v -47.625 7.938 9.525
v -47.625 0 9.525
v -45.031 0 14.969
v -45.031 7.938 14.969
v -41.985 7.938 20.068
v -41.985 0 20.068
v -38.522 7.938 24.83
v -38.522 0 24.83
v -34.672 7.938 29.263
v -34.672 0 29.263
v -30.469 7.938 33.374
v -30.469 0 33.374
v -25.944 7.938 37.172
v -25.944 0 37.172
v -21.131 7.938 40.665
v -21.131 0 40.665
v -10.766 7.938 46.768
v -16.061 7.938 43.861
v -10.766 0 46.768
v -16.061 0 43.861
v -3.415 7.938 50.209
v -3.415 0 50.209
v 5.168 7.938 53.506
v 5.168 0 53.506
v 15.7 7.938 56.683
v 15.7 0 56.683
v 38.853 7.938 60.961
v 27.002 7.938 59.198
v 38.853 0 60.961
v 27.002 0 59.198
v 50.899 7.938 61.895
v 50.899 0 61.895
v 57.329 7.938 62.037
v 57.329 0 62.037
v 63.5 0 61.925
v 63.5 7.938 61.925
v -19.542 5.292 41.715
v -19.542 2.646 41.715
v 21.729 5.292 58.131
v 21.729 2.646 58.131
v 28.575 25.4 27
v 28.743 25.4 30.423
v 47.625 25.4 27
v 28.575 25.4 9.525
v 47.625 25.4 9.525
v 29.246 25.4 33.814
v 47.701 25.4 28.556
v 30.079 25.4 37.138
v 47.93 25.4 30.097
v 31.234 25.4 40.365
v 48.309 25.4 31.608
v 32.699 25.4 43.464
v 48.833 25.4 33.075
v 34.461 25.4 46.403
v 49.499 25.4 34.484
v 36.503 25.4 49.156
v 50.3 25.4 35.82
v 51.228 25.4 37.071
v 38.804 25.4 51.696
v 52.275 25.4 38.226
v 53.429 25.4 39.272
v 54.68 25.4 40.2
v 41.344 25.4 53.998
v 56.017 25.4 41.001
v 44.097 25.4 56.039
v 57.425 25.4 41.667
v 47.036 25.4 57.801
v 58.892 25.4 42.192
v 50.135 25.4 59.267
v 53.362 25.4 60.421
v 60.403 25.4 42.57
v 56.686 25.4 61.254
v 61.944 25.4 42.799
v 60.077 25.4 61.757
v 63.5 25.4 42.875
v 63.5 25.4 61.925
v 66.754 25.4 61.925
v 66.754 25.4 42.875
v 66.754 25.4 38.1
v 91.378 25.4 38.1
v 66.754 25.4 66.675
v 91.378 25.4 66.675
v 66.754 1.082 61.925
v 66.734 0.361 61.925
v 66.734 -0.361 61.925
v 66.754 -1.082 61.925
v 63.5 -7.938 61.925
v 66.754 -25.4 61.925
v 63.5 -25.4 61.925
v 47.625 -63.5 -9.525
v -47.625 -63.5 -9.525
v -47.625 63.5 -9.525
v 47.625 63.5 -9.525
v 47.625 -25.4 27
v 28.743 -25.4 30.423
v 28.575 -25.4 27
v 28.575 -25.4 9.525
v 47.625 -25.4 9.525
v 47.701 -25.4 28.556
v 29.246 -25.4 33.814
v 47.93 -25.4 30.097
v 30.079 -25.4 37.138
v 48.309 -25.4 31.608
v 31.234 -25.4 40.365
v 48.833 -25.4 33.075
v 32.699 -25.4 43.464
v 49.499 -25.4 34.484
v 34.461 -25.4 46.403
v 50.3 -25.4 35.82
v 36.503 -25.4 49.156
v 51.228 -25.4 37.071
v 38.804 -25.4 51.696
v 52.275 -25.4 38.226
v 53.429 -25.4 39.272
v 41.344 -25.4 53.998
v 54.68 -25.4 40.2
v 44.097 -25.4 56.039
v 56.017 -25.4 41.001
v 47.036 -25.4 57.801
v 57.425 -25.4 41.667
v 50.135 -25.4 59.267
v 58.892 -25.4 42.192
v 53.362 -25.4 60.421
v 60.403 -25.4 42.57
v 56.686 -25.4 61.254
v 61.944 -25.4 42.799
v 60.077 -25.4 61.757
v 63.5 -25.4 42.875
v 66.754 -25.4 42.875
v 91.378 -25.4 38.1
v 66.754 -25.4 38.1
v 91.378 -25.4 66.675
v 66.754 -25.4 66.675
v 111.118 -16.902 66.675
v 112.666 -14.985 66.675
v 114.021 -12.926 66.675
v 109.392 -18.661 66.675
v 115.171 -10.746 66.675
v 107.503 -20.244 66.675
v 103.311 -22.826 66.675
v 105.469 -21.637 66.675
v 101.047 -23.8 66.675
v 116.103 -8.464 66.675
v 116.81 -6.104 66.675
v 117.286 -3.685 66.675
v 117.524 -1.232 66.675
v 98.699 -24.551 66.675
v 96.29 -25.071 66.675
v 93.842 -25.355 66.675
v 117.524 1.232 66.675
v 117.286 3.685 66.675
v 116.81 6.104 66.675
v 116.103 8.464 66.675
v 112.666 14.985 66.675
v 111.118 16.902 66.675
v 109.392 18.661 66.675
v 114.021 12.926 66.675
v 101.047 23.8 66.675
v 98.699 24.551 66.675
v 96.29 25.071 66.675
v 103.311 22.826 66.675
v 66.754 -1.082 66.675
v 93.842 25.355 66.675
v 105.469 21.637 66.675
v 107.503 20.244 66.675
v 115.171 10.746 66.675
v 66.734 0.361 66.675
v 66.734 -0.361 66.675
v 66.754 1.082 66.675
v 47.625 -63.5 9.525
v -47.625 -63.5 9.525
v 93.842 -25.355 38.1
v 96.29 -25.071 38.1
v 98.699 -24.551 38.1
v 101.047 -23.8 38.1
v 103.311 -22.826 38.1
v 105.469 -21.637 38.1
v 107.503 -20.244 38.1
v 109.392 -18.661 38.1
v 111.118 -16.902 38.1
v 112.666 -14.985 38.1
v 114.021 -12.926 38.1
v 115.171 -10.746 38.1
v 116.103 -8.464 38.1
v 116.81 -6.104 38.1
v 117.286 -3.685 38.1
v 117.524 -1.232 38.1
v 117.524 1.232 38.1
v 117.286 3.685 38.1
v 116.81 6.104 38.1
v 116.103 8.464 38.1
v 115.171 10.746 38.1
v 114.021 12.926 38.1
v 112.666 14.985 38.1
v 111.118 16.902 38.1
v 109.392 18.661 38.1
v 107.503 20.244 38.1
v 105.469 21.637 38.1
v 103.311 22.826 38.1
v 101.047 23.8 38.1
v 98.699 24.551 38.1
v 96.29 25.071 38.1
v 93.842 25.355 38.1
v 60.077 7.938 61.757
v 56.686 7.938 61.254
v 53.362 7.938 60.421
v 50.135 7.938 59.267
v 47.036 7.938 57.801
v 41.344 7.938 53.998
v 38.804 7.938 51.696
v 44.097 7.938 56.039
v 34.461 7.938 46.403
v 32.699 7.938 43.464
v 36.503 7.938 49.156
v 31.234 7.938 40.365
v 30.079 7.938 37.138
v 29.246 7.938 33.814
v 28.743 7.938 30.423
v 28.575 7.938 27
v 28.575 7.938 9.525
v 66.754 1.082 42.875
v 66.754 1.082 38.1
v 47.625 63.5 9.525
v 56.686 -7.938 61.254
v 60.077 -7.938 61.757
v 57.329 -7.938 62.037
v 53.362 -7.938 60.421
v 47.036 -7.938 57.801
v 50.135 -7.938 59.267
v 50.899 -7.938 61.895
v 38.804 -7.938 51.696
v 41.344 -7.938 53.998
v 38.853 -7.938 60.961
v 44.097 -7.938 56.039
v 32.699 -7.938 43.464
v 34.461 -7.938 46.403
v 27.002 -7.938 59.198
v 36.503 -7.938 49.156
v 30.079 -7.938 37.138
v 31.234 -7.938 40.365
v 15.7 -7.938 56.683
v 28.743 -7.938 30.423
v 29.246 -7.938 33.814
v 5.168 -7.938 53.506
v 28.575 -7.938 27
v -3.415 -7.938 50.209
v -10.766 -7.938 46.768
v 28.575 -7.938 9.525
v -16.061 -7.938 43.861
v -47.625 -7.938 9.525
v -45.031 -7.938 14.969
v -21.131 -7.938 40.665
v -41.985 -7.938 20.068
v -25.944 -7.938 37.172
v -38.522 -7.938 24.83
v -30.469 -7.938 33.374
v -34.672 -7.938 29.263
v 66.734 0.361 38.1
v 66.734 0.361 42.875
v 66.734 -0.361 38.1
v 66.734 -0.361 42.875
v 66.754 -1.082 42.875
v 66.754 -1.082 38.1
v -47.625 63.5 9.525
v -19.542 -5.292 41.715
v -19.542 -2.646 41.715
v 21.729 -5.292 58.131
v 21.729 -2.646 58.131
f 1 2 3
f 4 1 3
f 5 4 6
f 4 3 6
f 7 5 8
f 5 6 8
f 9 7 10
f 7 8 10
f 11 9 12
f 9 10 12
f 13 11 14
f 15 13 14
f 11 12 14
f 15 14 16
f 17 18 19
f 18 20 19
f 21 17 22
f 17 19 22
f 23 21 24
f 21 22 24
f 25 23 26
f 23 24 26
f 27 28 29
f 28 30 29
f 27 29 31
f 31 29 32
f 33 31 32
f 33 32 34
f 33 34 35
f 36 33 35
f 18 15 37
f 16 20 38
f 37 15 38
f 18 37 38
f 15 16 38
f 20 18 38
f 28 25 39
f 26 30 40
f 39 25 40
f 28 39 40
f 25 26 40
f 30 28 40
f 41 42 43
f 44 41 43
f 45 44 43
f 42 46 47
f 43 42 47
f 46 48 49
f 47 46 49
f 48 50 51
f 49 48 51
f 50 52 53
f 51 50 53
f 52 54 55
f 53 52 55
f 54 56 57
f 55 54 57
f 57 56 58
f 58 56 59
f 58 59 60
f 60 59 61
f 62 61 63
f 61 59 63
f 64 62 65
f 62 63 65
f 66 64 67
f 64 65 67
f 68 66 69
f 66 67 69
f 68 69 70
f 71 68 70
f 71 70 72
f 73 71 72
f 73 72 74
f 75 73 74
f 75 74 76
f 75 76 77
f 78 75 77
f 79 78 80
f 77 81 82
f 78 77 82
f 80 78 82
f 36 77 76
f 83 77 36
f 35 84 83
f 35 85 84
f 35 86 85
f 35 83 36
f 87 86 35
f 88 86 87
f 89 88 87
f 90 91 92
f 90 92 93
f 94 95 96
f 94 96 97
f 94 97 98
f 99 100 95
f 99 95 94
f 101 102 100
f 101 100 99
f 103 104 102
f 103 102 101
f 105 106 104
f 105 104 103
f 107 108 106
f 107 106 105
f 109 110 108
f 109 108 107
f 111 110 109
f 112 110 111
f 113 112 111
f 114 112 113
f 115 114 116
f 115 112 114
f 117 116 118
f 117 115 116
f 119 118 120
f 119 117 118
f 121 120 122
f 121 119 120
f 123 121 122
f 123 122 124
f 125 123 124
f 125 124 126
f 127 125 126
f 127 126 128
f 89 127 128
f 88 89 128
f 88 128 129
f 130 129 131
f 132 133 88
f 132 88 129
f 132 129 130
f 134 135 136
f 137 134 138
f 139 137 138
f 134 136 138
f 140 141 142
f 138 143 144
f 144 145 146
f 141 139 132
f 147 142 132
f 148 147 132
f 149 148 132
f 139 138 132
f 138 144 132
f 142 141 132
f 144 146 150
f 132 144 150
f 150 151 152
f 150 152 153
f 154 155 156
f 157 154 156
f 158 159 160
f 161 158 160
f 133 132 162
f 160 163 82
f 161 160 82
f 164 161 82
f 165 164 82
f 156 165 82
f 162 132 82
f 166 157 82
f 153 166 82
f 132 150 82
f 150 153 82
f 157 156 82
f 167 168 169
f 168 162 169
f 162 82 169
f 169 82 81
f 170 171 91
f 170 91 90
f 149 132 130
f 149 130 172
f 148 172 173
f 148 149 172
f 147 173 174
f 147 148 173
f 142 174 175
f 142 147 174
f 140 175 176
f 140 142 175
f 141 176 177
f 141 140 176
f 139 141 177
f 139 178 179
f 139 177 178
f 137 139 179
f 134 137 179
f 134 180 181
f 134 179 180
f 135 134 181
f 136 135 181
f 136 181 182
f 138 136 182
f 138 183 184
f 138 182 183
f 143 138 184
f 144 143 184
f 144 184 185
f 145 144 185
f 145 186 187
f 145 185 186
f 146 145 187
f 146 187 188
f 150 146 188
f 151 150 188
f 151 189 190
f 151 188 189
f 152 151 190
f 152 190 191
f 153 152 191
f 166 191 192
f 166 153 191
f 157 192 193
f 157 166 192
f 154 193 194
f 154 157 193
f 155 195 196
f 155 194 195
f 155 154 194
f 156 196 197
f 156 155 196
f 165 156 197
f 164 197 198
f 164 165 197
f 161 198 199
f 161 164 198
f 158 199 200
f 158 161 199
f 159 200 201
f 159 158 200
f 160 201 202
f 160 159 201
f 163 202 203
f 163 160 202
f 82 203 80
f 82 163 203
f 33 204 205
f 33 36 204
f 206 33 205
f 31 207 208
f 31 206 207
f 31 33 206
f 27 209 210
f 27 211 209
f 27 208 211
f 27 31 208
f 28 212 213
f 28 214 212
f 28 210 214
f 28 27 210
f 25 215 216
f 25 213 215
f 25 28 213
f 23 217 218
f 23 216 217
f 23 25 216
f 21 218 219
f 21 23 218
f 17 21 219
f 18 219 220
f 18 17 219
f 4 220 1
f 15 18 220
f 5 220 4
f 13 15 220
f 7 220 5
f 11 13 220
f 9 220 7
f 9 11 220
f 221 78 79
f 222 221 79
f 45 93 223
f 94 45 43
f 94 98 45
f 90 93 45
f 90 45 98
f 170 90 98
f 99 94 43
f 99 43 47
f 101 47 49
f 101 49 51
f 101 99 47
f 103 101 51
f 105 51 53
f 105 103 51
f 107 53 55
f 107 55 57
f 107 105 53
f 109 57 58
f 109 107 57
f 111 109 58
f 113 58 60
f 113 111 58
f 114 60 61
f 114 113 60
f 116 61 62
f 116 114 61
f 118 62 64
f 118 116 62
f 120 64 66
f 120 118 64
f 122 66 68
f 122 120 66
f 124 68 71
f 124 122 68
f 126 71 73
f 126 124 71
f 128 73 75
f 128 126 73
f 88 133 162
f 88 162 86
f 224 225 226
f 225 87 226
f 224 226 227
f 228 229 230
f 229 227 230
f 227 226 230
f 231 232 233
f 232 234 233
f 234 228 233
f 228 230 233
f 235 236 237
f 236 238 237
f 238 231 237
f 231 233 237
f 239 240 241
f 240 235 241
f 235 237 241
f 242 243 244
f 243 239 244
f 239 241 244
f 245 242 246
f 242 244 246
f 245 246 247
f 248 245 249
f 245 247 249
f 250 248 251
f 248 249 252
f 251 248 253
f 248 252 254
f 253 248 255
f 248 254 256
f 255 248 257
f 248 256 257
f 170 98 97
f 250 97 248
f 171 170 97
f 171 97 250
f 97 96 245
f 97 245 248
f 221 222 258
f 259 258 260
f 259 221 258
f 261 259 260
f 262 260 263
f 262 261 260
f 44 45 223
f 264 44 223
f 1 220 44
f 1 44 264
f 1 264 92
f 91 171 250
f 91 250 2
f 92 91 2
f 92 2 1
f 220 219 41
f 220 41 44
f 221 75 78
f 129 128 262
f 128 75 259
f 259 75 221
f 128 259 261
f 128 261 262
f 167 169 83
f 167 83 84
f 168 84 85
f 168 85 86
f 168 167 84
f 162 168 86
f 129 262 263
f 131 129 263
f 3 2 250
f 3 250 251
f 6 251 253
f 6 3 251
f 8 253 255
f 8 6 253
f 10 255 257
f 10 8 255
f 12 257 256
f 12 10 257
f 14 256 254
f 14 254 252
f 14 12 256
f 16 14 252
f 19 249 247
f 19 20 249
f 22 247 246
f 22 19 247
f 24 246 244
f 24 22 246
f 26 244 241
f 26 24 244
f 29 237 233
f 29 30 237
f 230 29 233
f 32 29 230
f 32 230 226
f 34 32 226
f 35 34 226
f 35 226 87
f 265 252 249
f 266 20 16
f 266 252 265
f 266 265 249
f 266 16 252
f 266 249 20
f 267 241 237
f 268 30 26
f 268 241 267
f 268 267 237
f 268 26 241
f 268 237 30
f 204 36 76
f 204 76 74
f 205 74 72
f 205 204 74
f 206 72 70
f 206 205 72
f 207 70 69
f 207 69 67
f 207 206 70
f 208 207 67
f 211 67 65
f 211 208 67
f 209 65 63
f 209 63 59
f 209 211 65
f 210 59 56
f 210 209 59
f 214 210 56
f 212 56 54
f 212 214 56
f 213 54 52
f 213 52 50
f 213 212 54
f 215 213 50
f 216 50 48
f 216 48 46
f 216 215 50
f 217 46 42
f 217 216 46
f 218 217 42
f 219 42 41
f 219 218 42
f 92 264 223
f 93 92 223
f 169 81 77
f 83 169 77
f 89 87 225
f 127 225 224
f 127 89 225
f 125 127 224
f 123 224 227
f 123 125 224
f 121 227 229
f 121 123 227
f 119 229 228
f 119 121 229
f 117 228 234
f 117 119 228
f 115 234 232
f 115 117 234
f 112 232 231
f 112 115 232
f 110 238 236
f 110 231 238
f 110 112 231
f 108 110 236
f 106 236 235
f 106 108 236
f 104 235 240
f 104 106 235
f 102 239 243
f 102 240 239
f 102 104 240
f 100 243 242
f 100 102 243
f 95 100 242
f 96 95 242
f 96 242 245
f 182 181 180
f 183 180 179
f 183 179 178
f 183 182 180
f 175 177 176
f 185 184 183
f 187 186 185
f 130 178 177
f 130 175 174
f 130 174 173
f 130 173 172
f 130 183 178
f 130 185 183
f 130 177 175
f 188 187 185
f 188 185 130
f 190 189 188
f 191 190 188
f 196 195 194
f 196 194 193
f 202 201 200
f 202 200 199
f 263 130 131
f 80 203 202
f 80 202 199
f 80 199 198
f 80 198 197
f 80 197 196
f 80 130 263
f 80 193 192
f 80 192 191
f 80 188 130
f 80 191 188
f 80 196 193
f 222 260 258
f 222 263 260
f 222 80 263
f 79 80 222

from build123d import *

# Parameters (mm, degrees)
F1_DEPTH = 63.5
F2_DEPTH = 25.4
F3_DEPTH = 25.4
F4_DEPTH = 7.9375
F0_W     = 25.4115133166
F0_H     = 28.575


with BuildPart() as f1:
    # F0 (on Front) → F1 (new body, symmetric)
    with BuildSketch(Plane.XZ):
        Polygon((28.575, 9.525), (-47.625, 9.525), (-47.625, -9.525), (47.625, -9.525), (47.625, 9.525), align=None)
    extrude(amount=F1_DEPTH, both=True)

    # F0 (on Front) → F2 (join, symmetric)
    with BuildSketch(Plane.XZ):
        with BuildLine():
            Line((28.575, 27.0002), (28.575, 9.525))
            Line((28.575, 9.525), (47.625, 9.525))
            Line((47.625, 9.525), (47.625, 27.0002))
            ThreePointArc((47.625, 27.0002), (52.2746798487, 38.2255201513), (63.5, 42.8752))
            Line((63.5, 42.8752), (66.754385829, 42.8752))
            Line((66.754385829, 42.8752), (66.754385829, 61.9252))
            Line((66.754385829, 61.9252), (63.5, 61.9252))
            ThreePointArc((63.5, 61.9252), (38.8042956671, 51.6959043329), (28.575, 27.0002))
        make_face()
    extrude(amount=F2_DEPTH, both=True)

    # F0 (on Front) → F3 (join, symmetric)
    with BuildSketch(Plane.XZ):
        Polygon((66.754385829, 66.675), (66.754385829, 61.9252), (66.754385829, 42.8752), (66.754385829, 38.1), (92.1428725123, 38.1), (92.1428725123, 66.675), align=None)
    extrude(amount=F3_DEPTH, both=True)

    # F0 (on Front) → F4 (join, symmetric)
    with BuildSketch(Plane.XZ):
        with BuildLine():
            add(Edge.make_bspline(
                [(-47.625, 9.525), (-30.3663147909, 50.6522115959), (25.7086480849, 63.3923630702), (63.5, 61.9252)],
                knots=[0, 0, 0, 0, 122.8598656398, 122.8598656398, 122.8598656398, 122.8598656398], degree=3))
            Line((-47.625, 9.525), (28.575, 9.525))
            Line((28.575, 9.525), (28.575, 27.0002))
            ThreePointArc((28.575, 27.0002), (38.8042956671, 51.6959043329), (63.5, 61.9252))
        make_face()
    extrude(amount=F4_DEPTH, both=True)

    # F0 (on Front) → F5 (revolve)
    with BuildSketch(Plane.XZ):
        with Locations((104.8486291707, 52.3875)):
            Rectangle(F0_W, F0_H)
    revolve(axis=Axis((92.1428725123, 0, 52.3875), (0, 0, 1)))


solid = f1.part
